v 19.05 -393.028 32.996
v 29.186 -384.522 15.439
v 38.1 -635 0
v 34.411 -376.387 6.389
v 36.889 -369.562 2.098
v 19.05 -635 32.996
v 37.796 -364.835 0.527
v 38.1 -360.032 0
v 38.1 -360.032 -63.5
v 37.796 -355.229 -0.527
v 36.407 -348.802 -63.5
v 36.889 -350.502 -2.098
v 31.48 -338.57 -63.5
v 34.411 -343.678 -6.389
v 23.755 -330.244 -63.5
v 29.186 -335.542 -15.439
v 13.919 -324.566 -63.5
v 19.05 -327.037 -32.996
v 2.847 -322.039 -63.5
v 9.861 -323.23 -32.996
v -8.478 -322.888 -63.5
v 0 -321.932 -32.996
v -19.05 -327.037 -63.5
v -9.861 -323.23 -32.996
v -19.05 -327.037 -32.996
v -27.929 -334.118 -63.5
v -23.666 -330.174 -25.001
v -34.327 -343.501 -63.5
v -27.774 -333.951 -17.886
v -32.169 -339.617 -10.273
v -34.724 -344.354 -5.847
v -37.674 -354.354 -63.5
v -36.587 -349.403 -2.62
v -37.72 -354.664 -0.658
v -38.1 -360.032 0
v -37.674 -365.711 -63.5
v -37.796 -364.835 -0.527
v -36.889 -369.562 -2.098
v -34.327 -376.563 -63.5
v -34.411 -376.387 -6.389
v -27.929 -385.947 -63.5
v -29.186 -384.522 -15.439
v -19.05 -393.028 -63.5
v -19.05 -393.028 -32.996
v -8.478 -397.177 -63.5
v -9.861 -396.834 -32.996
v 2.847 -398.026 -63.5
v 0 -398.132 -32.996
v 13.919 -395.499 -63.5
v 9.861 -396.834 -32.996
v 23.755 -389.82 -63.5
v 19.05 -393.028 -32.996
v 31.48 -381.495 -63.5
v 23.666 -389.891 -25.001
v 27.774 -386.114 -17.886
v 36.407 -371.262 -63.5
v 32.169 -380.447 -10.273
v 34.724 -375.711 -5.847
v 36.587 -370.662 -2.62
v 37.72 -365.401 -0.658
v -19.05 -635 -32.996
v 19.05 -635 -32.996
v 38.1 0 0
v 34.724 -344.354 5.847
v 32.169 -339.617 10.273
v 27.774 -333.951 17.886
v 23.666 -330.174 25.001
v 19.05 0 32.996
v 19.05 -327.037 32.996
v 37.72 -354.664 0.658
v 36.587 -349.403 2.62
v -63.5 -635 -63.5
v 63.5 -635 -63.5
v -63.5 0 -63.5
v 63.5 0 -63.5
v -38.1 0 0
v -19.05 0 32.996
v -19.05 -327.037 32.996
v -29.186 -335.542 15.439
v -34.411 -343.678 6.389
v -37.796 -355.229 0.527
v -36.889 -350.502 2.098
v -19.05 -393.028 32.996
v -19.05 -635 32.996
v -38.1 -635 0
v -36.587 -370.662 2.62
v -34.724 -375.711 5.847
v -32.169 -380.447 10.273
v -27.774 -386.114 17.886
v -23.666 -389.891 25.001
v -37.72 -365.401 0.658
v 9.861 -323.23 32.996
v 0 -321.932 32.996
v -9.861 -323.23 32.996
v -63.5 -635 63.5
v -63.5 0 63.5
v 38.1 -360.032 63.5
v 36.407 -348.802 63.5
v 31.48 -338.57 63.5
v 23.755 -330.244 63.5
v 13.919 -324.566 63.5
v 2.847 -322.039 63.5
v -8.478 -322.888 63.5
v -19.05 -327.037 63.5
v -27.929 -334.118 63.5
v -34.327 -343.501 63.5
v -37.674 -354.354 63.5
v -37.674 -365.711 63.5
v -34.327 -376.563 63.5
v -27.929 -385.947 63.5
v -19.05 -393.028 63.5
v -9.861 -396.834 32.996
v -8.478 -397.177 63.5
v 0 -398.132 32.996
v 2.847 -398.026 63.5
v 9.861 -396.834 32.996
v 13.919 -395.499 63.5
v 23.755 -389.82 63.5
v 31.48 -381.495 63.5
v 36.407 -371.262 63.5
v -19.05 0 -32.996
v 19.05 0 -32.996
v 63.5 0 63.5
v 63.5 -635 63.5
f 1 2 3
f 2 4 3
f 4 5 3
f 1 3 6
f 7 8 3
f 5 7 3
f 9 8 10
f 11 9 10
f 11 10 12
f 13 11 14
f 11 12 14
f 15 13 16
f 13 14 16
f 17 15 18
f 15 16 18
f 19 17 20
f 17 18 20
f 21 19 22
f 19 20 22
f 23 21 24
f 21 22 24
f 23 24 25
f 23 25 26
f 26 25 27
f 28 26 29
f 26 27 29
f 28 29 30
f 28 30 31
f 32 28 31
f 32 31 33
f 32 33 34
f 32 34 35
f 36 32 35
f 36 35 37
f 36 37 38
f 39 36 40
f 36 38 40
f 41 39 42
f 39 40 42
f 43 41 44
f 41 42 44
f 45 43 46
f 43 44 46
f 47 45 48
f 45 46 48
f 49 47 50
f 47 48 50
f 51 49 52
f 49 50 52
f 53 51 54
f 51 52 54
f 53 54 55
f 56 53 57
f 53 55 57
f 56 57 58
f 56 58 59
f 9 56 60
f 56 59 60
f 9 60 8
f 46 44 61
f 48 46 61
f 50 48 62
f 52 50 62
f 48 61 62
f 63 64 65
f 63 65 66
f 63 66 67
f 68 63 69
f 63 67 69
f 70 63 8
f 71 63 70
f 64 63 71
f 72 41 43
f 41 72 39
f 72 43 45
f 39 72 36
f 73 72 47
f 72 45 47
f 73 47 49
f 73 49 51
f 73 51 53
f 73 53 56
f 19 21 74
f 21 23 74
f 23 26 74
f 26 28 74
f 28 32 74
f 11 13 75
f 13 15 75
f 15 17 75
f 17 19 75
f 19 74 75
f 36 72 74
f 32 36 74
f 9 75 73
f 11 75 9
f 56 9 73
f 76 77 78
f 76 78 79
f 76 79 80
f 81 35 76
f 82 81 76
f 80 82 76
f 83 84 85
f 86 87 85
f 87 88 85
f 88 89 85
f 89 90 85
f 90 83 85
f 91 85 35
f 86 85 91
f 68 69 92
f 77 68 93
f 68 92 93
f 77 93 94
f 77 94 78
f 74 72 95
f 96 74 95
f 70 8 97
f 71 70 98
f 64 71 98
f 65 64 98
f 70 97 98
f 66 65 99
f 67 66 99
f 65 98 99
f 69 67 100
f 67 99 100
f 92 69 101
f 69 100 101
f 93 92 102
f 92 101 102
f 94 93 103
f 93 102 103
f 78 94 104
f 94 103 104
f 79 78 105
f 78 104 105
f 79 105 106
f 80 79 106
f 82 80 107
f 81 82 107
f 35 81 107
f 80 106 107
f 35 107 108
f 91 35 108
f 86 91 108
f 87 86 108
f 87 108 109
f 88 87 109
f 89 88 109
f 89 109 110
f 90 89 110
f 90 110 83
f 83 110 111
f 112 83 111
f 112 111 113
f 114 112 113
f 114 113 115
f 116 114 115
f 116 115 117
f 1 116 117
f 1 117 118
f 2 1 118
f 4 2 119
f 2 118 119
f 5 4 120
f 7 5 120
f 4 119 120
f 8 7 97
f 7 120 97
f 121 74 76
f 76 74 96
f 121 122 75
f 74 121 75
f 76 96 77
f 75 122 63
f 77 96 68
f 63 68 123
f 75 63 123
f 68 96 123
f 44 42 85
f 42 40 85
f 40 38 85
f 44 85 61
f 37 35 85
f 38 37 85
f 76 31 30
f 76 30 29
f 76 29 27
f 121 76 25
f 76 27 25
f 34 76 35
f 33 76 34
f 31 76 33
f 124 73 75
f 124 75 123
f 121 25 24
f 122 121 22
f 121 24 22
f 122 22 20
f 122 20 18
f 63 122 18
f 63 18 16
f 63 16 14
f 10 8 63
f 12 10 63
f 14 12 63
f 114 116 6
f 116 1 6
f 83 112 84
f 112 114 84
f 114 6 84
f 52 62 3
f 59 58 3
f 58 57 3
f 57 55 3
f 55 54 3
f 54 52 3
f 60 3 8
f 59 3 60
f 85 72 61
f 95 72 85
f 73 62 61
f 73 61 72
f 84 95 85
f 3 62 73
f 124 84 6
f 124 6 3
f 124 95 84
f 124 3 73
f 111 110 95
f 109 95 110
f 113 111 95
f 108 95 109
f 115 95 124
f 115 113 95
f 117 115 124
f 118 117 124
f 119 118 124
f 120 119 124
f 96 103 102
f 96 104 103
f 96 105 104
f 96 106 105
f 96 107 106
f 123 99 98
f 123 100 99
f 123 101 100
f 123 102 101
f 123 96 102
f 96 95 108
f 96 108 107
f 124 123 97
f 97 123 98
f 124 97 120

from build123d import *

# Parameters (mm, degrees)
F0_W     = 127
F0_H     = 127
F1_DEPTH = 635
F2_R     = 38.1
F3_DEPTH = 127.001
F5_DEPTH = 635.001


with BuildPart() as f1:
    # F0 (on Front) → F1 (new body)
    with BuildSketch(Plane.XZ):
        Rectangle(F0_W, F0_H)
    extrude(amount=F1_DEPTH)

    # F2 (on face) → F3 (cut, through all)
    with BuildSketch(Plane.XY.offset(63.5)):
        with Locations((0, -360.032264)):
            Circle(F2_R)
    extrude(amount=-F3_DEPTH, mode=Mode.SUBTRACT)

    # F4 (on face) → F5 (cut, through all)
    with BuildSketch(Plane.XZ.offset(635)):
        Polygon((19.05, -32.995568), (38.1, 0), (19.05, 32.995568), (-19.05, 32.995568), (-38.1, 0), (-19.05, -32.995568), align=None)
    extrude(amount=-F5_DEPTH, mode=Mode.SUBTRACT)


solid = f1.part
